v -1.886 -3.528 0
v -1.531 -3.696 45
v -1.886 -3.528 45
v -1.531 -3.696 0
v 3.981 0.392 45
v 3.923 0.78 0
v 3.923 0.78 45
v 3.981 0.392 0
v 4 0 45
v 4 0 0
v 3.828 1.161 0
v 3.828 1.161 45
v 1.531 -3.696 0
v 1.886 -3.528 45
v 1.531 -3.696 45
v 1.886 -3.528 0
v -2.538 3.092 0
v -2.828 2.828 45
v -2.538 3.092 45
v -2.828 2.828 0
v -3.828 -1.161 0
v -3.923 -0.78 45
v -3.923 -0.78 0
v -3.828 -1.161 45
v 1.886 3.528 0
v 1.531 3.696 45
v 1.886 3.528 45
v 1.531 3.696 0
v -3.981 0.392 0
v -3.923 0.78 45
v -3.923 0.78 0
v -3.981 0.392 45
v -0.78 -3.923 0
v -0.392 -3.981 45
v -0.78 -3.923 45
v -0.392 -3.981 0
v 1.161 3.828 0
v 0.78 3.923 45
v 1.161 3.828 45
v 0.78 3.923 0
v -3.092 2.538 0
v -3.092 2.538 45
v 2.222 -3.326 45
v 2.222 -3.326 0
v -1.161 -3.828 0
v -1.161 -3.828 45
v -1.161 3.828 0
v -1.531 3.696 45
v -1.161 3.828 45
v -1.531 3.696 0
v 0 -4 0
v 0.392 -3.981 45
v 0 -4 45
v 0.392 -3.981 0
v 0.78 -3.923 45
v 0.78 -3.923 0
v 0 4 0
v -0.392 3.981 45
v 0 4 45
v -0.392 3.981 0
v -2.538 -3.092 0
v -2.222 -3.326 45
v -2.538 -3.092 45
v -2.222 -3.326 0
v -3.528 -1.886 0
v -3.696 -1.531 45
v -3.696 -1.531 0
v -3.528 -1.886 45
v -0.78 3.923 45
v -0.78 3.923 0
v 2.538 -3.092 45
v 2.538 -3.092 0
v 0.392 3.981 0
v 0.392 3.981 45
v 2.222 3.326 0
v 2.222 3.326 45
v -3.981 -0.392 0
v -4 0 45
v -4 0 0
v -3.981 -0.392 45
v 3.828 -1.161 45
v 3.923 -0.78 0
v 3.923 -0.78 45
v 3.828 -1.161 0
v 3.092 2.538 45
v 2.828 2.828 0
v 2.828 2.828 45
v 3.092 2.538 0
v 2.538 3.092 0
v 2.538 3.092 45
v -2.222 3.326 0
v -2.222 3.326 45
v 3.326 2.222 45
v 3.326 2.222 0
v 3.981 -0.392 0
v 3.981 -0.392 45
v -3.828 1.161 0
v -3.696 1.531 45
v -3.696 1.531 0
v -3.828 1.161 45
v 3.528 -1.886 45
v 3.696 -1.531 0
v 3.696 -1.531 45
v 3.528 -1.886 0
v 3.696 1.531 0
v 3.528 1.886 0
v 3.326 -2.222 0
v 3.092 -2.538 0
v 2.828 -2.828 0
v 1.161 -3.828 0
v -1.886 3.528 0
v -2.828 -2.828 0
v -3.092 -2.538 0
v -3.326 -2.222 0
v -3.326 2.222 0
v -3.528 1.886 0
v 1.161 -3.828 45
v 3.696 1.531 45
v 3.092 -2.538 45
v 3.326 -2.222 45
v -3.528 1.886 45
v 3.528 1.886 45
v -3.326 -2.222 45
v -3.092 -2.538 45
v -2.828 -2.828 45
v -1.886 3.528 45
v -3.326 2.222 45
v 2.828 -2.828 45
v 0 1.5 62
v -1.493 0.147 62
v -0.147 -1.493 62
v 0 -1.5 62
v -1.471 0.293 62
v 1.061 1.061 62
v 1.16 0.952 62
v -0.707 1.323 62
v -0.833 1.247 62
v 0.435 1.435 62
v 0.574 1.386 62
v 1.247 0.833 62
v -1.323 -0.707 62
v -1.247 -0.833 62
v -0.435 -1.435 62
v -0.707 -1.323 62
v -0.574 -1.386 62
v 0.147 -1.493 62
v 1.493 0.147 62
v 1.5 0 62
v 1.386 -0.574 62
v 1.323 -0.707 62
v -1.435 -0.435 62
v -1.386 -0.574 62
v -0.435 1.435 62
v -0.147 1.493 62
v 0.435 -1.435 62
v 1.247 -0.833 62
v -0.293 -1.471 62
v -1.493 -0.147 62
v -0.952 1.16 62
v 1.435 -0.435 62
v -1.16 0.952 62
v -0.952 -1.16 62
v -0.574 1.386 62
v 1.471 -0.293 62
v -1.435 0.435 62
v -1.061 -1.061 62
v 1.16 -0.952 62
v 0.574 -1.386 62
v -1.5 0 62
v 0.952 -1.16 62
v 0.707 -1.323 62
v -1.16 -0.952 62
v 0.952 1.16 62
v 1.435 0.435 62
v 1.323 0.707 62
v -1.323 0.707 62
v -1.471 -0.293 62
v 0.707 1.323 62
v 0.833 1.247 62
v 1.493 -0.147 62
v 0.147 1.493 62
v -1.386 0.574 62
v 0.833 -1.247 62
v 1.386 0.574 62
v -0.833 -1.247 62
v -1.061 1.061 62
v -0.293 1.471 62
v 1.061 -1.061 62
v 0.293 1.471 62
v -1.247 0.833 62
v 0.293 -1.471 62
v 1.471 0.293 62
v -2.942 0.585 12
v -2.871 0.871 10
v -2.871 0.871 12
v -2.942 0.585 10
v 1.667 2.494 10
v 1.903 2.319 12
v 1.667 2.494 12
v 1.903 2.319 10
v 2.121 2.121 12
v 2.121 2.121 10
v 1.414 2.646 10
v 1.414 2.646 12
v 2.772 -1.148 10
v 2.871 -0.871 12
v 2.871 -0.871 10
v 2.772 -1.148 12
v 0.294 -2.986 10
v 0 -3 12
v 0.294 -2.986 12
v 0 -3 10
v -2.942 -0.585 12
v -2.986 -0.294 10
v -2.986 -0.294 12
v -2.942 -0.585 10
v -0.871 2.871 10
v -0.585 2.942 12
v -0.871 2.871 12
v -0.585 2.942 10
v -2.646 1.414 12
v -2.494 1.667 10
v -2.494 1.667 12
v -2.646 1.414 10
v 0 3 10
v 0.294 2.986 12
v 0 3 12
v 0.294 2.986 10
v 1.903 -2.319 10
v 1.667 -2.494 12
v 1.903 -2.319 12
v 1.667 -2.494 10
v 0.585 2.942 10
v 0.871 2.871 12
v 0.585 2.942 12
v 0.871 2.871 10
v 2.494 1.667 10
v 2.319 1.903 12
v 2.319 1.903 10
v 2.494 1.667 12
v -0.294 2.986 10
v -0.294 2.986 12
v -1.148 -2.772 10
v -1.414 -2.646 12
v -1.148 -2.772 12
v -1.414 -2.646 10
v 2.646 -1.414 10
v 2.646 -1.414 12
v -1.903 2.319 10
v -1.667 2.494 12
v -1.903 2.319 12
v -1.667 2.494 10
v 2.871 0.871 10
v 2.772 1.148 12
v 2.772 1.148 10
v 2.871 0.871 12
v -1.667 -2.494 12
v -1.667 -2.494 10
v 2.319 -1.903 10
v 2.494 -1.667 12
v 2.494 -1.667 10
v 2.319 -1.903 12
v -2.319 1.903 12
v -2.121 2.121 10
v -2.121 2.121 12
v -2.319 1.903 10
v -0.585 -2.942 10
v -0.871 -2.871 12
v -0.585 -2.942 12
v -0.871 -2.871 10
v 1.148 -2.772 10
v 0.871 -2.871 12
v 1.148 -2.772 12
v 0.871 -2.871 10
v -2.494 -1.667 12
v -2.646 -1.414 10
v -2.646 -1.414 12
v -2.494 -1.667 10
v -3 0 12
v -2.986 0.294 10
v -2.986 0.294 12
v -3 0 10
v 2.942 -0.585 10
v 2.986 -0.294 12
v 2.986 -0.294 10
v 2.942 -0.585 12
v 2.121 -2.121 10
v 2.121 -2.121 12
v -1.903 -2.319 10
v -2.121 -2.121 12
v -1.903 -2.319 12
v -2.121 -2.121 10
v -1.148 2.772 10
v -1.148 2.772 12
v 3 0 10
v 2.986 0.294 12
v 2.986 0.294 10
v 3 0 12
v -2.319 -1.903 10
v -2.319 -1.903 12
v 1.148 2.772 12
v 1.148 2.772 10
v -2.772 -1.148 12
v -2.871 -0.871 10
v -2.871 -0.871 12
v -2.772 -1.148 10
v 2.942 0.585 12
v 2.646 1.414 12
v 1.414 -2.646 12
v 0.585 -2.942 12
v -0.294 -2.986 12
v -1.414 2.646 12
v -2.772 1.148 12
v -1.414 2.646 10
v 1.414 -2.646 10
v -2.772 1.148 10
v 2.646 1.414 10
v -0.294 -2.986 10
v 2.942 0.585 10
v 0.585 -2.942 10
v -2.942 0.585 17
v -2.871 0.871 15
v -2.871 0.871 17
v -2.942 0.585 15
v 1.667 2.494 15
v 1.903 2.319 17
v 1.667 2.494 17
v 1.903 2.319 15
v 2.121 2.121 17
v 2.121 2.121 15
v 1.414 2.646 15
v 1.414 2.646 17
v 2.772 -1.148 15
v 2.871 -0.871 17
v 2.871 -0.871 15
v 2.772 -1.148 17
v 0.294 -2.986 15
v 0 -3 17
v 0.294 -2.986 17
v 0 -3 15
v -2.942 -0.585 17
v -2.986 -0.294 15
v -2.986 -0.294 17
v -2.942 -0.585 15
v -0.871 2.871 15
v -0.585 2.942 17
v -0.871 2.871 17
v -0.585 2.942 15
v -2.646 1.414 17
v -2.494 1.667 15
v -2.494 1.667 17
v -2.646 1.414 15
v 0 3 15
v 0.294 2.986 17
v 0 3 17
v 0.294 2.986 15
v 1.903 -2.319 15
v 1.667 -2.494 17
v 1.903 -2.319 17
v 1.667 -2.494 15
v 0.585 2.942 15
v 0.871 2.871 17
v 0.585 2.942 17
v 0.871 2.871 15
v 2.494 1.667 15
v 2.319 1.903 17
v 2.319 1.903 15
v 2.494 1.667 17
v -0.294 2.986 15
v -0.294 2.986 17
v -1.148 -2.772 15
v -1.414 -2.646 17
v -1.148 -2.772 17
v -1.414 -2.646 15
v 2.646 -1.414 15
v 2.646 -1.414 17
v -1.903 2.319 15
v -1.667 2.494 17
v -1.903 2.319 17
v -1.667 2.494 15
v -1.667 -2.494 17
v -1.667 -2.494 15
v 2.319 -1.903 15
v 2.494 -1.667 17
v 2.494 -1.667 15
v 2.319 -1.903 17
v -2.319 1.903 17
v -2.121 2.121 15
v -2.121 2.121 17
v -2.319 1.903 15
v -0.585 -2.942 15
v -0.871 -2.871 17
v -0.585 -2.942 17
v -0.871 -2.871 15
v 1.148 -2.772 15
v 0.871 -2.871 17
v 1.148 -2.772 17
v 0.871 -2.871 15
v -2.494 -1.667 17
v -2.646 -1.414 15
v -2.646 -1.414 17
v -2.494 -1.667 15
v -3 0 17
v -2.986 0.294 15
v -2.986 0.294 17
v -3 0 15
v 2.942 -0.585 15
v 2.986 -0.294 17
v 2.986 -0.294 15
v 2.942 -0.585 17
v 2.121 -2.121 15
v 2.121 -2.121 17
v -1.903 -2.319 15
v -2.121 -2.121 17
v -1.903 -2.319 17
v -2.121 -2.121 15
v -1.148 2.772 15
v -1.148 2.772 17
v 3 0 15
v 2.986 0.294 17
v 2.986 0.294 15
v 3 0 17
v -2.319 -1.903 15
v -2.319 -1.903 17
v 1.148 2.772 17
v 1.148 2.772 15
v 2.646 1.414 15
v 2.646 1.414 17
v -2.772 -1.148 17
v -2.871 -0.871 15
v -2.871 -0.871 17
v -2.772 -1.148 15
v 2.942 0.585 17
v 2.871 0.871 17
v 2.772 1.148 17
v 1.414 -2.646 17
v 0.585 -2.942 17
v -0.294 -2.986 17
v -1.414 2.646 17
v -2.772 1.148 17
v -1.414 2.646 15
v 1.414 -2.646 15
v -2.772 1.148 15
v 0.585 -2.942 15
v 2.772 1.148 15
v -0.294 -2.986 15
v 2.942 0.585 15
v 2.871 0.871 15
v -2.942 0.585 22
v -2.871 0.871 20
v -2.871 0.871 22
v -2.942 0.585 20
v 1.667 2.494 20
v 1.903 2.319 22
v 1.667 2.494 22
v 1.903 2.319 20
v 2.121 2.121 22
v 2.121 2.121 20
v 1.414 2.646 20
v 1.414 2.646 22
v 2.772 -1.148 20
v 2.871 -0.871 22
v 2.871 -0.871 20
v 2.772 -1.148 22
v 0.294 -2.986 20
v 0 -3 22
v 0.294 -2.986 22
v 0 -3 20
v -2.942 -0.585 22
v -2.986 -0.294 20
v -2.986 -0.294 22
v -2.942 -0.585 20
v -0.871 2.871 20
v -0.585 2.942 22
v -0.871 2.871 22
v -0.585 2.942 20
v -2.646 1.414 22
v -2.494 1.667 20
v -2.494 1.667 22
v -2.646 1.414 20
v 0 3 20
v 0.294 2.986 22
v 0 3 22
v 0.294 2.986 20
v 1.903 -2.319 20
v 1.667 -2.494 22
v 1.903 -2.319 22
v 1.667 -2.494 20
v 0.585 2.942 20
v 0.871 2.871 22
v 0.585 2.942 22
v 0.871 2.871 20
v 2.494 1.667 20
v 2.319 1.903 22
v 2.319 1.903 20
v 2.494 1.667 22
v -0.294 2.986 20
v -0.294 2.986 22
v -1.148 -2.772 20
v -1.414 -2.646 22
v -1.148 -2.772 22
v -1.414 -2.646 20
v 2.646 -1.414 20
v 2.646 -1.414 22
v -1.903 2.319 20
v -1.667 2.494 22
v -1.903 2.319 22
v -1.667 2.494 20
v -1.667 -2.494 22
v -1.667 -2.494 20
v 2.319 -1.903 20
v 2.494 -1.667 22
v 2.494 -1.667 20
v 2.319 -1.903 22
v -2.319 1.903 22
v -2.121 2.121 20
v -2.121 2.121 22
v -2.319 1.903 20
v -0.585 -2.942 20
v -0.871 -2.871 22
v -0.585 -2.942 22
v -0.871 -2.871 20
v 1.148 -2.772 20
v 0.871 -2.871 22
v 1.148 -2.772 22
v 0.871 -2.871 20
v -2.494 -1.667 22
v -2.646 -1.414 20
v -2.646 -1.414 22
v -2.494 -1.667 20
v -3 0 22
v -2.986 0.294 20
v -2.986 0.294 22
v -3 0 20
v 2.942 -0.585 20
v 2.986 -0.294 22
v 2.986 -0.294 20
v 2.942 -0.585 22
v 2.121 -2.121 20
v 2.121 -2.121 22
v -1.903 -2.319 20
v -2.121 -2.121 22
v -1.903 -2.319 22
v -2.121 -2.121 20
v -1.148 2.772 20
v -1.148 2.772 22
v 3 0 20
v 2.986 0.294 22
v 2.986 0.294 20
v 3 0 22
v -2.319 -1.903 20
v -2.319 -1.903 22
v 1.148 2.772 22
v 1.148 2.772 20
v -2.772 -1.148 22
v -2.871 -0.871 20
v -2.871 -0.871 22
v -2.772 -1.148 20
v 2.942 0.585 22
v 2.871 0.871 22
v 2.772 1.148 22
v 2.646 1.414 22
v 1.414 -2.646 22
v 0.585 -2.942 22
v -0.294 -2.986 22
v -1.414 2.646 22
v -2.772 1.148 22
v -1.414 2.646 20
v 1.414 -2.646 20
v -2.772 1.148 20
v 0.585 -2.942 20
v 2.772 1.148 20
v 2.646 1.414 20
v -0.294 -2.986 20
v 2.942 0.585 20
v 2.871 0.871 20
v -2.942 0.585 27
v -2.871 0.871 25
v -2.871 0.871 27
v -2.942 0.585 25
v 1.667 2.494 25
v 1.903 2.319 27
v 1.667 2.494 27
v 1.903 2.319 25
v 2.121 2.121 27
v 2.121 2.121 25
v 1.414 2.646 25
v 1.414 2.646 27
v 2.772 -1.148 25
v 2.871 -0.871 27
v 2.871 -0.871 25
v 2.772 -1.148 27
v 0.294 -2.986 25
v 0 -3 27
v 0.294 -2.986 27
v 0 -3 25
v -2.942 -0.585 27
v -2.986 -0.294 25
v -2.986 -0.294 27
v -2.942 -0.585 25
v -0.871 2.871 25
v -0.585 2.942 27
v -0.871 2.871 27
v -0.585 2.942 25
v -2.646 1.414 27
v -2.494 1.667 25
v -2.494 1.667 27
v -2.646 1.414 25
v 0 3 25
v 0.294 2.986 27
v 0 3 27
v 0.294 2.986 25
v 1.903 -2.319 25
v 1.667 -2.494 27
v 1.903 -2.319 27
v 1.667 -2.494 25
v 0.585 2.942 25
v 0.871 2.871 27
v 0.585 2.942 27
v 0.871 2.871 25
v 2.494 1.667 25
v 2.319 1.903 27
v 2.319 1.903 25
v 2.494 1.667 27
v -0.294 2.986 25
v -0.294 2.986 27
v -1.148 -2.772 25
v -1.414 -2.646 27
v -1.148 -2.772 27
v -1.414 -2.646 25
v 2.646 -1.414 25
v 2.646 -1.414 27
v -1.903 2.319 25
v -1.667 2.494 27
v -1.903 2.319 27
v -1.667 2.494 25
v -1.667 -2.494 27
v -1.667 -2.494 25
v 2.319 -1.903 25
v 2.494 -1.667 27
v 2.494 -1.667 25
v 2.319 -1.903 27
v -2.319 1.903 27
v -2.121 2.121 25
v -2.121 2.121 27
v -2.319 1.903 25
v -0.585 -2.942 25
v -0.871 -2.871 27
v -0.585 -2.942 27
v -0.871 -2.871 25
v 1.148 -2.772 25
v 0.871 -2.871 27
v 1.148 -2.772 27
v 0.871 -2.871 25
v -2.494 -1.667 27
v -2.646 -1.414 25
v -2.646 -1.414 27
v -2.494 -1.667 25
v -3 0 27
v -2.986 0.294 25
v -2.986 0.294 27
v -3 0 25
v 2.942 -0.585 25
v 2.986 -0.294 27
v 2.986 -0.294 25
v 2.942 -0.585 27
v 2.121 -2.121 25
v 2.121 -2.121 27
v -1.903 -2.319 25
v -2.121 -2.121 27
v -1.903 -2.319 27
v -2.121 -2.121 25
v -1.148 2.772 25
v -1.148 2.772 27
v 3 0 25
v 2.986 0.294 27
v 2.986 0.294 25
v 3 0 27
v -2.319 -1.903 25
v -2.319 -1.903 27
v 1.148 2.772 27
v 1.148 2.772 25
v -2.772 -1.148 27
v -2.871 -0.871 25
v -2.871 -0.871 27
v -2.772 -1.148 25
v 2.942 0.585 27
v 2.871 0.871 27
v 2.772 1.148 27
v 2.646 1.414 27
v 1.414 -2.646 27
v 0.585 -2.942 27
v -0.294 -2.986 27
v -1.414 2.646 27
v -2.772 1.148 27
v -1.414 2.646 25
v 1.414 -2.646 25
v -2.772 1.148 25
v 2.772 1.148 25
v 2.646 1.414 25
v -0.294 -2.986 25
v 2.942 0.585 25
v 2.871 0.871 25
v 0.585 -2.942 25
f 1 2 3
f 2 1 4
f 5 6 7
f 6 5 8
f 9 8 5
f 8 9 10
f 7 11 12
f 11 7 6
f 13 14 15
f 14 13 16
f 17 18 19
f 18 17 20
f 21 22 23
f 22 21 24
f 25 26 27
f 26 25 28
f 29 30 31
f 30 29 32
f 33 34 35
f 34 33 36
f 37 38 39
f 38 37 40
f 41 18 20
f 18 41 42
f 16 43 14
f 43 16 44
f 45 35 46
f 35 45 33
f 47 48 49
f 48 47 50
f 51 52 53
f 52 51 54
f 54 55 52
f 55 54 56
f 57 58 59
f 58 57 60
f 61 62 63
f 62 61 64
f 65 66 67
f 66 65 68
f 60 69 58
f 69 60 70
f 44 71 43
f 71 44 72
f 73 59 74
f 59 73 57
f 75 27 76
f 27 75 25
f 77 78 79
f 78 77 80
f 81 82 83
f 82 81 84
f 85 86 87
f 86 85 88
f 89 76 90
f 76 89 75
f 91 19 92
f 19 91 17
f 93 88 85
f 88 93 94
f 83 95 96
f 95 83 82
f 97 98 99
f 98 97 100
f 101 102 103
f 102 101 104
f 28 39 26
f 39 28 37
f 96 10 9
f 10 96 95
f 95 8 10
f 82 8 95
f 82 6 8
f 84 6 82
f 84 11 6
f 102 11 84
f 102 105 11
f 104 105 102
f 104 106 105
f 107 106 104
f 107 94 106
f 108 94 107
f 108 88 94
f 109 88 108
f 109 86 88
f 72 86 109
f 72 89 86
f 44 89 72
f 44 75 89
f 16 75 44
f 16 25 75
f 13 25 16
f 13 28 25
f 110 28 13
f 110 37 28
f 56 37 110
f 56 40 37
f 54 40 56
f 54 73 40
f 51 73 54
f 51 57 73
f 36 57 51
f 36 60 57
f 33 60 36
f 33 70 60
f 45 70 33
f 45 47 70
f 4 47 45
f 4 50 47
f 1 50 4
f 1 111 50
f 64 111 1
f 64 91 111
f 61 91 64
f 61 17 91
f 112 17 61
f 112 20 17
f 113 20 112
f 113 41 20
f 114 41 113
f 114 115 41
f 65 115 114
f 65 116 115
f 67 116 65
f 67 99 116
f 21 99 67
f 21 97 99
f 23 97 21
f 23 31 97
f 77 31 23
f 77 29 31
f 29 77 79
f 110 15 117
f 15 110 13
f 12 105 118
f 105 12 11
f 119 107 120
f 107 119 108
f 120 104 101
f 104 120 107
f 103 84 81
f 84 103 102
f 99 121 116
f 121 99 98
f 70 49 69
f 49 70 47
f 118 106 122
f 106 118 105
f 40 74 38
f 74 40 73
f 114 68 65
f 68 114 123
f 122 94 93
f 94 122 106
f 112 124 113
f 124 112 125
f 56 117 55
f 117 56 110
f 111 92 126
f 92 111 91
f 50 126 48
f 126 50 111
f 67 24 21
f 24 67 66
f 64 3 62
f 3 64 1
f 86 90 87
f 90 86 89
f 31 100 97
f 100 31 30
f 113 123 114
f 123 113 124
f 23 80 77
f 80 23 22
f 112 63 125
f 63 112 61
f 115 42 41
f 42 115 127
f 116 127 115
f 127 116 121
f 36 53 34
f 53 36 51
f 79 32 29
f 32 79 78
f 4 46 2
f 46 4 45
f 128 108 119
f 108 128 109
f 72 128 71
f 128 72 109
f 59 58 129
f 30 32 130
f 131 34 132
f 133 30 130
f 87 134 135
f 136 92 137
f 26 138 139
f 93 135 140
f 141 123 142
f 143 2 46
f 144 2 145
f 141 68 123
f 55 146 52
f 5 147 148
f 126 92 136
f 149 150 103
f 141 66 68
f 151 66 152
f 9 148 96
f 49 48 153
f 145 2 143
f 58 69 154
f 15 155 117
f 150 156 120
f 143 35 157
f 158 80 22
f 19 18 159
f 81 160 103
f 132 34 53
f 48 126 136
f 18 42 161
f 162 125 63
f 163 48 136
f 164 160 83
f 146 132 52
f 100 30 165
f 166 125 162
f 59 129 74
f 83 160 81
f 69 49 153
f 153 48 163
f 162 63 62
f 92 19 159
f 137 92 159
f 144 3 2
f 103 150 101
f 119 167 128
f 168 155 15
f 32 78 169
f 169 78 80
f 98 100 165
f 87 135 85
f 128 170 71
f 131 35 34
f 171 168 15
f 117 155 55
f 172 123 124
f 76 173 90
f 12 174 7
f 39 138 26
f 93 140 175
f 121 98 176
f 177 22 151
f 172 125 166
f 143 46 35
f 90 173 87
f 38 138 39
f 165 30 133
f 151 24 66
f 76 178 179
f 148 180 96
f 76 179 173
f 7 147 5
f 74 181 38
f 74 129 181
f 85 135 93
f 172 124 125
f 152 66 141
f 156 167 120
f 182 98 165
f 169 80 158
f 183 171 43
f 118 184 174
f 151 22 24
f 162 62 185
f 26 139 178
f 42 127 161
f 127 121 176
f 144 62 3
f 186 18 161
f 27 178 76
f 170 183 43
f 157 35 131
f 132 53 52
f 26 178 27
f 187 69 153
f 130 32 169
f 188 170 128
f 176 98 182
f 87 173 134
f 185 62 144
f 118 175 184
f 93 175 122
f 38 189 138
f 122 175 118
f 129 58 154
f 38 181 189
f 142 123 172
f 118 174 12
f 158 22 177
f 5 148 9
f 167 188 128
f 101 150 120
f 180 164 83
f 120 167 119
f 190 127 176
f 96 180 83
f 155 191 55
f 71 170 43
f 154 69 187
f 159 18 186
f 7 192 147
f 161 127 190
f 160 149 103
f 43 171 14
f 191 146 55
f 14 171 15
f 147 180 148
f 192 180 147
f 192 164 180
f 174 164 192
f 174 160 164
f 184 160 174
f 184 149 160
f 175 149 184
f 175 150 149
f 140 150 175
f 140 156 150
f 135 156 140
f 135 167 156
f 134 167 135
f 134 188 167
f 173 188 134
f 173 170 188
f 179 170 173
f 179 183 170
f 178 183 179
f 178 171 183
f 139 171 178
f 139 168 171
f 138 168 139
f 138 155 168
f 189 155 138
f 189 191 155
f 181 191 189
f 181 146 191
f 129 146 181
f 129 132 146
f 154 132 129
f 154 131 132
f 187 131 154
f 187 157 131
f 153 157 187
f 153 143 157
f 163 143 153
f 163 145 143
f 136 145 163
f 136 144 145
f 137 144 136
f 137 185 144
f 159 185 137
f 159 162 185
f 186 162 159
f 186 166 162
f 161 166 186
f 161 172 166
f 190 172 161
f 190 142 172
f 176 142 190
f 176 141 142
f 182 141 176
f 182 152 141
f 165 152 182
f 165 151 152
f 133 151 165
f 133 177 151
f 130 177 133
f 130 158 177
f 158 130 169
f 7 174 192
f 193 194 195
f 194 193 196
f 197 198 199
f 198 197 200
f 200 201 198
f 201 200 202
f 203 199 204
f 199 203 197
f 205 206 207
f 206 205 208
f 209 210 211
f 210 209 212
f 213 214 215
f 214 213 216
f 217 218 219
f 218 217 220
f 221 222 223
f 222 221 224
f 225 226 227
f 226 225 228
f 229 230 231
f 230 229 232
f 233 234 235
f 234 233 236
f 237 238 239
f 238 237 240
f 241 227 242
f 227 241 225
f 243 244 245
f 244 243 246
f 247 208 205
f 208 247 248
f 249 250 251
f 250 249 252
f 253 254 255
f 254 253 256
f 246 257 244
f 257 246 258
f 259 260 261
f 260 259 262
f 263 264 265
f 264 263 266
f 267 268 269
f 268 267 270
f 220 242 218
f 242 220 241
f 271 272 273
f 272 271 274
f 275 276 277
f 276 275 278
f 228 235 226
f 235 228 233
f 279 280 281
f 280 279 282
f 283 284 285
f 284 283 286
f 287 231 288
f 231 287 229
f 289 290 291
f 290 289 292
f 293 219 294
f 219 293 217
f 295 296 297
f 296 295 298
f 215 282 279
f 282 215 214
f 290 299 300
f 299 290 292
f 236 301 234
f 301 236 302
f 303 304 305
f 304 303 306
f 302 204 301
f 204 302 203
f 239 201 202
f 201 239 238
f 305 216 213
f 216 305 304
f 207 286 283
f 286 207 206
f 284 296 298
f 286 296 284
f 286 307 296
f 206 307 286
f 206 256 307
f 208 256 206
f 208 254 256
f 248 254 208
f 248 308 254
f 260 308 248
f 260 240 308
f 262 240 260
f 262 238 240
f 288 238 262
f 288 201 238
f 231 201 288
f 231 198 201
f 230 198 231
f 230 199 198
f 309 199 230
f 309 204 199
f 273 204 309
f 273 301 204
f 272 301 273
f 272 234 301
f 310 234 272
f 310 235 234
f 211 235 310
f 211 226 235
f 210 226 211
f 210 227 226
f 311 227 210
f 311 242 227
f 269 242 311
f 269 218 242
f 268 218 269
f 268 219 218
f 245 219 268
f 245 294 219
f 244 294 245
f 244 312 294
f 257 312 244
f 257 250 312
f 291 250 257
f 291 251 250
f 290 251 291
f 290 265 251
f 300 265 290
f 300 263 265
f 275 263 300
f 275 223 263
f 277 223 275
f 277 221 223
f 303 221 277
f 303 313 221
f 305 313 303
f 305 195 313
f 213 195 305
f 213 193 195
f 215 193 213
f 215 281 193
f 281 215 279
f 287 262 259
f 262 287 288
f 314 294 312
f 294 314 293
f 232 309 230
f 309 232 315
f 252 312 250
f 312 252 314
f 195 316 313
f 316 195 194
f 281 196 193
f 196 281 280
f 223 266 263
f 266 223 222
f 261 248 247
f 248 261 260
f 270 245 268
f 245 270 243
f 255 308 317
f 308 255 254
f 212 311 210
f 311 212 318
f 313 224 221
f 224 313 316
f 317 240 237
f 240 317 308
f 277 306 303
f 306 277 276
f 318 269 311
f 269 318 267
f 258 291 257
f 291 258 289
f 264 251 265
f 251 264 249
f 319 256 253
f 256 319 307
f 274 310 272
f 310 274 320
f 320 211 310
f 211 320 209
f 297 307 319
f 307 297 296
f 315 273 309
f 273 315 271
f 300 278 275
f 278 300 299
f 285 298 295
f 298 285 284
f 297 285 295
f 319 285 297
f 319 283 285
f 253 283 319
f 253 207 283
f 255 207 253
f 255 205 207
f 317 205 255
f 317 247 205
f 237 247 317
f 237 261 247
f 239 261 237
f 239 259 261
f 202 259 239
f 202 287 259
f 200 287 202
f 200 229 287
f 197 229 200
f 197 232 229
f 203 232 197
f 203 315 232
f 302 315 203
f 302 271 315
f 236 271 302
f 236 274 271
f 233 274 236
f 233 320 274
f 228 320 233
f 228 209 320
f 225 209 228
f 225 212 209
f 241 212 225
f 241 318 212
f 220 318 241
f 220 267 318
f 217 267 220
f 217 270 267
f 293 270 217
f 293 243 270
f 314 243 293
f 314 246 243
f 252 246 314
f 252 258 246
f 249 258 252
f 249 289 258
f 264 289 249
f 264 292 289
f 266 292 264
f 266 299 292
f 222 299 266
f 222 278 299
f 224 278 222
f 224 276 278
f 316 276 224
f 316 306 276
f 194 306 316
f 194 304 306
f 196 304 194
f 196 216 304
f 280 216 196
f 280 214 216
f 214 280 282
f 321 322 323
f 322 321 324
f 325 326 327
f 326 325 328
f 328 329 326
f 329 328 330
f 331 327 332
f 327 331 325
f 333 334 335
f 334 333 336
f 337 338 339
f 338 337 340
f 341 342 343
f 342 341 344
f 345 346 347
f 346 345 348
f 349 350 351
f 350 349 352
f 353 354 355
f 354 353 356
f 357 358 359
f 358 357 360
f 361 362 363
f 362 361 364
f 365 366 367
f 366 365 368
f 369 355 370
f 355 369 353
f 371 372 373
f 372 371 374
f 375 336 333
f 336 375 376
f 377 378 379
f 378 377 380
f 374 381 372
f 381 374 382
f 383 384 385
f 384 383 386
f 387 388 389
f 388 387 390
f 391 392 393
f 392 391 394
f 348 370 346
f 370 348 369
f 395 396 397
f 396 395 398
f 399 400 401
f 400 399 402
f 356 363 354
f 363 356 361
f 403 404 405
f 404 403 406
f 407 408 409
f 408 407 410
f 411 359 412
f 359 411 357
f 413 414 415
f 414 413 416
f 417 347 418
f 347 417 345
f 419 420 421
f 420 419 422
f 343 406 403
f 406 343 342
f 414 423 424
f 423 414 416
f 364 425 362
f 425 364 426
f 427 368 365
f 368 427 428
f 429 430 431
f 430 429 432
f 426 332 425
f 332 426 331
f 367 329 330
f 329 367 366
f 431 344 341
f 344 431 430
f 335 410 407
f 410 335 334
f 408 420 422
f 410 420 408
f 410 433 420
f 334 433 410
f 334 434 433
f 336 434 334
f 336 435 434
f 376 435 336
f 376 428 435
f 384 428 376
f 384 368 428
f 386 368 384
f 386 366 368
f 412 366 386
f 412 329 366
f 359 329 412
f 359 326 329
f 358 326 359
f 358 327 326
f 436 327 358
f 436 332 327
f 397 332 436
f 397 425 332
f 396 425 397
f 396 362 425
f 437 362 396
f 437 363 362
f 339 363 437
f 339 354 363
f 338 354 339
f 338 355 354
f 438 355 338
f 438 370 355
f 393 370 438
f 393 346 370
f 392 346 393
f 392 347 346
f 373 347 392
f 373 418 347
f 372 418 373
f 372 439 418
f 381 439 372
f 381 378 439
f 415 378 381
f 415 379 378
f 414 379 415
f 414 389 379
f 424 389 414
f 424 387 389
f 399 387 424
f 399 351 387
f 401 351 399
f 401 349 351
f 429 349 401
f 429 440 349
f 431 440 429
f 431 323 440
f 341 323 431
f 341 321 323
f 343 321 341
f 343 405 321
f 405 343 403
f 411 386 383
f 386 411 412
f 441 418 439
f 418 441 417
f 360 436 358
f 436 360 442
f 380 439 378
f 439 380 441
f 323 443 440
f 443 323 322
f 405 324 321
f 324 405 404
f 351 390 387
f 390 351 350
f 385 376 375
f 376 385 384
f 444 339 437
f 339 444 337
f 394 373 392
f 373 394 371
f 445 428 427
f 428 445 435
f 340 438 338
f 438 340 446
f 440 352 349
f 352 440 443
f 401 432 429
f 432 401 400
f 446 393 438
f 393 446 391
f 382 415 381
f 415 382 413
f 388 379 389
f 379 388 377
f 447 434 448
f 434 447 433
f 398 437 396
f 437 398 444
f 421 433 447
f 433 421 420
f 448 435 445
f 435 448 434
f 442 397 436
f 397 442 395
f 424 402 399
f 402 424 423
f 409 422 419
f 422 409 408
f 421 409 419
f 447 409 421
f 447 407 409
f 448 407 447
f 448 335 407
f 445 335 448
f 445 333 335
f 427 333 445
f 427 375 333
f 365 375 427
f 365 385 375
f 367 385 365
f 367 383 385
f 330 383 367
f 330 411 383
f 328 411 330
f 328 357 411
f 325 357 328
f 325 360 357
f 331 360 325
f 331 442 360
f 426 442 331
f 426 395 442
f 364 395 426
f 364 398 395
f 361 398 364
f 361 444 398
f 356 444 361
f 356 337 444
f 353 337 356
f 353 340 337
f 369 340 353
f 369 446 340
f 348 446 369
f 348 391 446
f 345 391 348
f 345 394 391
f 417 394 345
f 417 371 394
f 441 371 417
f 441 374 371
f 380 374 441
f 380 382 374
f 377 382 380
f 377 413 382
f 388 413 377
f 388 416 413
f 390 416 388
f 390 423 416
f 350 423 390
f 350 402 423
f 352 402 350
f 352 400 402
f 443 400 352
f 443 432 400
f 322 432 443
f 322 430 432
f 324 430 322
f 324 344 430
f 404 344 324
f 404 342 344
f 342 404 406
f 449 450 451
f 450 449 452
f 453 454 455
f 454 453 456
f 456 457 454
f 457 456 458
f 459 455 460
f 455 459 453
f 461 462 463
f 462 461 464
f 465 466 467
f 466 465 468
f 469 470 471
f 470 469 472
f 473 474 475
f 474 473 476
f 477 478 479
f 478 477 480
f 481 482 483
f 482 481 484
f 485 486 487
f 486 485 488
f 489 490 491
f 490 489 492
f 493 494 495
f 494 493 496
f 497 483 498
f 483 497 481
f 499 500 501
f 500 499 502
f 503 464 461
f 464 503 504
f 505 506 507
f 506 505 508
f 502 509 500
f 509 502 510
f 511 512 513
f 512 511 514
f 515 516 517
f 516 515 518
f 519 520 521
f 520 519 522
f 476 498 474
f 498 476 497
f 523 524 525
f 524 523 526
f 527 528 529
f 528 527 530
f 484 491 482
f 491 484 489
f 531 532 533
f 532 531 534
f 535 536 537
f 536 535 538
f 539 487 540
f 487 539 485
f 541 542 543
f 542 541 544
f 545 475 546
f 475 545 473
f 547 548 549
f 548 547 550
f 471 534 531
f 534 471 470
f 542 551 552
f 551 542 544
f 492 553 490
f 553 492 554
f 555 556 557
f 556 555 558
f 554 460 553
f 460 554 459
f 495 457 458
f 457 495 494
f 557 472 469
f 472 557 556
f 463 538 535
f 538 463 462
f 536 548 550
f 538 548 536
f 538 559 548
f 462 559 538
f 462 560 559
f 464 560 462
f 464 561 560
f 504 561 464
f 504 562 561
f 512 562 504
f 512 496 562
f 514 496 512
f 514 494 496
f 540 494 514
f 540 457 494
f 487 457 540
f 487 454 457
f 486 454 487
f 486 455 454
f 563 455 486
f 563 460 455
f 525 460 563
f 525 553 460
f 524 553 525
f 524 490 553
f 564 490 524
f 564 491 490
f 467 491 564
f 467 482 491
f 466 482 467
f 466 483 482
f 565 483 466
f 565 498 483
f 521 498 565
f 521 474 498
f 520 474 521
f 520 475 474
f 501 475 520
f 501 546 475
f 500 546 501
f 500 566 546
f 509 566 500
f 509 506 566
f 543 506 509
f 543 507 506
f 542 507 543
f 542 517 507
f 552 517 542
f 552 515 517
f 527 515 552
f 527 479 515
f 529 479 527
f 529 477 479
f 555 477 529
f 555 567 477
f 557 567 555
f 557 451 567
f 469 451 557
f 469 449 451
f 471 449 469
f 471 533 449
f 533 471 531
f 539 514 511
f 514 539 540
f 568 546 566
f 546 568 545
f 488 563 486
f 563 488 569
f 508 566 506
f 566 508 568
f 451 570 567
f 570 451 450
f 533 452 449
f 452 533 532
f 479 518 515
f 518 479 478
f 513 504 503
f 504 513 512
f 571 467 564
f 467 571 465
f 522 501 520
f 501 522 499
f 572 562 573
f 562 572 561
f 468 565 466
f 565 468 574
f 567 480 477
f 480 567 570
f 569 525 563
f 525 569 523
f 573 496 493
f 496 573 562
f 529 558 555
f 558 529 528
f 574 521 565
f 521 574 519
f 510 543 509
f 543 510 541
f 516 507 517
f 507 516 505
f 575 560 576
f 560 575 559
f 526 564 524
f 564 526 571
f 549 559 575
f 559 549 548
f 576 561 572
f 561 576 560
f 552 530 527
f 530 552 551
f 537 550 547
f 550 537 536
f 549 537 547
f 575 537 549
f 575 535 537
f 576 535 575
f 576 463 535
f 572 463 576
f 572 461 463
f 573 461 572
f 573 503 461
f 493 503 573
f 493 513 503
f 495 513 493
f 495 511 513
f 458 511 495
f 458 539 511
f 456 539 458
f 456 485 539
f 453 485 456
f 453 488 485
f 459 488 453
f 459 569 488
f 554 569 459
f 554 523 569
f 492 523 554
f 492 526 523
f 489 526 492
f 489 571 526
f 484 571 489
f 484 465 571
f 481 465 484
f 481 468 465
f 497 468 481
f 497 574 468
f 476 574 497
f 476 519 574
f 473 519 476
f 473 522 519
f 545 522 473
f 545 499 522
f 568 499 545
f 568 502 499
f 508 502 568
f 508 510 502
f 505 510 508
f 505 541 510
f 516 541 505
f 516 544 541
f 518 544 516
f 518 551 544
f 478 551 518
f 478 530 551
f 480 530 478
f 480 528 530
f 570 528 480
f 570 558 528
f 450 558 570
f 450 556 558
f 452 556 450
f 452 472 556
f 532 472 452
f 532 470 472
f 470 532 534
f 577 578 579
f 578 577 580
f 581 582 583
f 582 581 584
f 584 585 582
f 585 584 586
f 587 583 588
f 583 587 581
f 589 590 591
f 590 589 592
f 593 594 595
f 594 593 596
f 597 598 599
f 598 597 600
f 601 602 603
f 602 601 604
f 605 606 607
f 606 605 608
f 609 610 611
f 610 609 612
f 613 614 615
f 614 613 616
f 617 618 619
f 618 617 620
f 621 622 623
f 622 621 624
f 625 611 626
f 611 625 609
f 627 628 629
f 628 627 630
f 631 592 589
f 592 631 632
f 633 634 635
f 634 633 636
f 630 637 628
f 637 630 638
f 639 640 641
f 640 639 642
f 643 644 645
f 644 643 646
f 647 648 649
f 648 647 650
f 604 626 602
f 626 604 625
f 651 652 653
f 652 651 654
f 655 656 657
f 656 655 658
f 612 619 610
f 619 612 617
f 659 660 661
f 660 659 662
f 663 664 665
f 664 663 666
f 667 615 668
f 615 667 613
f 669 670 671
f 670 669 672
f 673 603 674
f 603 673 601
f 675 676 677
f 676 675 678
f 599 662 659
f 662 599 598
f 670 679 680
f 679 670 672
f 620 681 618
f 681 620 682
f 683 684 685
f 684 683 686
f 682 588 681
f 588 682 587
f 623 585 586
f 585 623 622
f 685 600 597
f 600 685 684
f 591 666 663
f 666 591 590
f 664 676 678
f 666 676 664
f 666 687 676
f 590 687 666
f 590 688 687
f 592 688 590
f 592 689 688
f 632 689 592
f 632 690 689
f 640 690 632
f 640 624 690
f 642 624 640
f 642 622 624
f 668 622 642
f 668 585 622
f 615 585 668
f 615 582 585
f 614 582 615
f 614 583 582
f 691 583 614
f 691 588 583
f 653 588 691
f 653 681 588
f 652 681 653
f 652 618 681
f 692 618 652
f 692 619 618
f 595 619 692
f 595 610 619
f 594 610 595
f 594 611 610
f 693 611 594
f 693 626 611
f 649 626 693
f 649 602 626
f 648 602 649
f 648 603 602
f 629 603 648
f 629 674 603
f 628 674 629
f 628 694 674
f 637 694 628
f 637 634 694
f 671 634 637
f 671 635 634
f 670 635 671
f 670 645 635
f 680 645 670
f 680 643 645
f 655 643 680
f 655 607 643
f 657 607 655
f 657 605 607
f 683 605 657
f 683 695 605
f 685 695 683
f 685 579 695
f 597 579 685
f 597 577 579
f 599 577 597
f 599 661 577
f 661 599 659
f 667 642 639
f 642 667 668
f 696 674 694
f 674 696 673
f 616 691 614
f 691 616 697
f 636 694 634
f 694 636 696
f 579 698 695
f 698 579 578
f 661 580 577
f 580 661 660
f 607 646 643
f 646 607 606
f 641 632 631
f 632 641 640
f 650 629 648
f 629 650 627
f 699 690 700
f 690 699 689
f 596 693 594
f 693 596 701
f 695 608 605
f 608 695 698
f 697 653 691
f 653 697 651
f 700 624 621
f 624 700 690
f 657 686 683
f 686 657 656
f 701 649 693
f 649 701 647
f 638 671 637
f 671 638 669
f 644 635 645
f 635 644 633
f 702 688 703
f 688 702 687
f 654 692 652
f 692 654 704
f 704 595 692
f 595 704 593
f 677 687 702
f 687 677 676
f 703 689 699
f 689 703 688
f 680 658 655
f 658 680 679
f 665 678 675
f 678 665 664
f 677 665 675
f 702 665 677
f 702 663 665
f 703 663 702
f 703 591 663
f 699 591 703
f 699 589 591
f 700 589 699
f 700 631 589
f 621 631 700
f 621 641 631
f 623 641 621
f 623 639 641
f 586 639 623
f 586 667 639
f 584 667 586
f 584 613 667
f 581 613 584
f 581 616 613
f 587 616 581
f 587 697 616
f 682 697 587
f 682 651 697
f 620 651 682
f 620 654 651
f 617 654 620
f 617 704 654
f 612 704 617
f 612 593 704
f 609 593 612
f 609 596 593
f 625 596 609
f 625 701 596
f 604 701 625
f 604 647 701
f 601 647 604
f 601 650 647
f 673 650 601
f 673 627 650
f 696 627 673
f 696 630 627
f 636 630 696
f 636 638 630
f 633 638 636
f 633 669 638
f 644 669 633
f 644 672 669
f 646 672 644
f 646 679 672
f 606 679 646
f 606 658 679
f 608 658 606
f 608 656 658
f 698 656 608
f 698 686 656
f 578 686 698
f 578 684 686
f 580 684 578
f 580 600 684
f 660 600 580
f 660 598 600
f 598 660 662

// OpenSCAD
// Pestle for grinding tissue inside a 1.5 mL microcentrifuge tube - a cylindrical handle with
// grip grooves, a tapering cone, and a rounded tip. Printed standing upright (z = 0 at the
// bottom). NOVEL general part.
//

handle_d = 8;
cone_top = 8;
cone_bot = 3;
tip_d    = 3;
groove_w = 2;
groove_d = 1;

$fn = 64;

handle_h = 45;
cone_h   = 62 - 45;
tip_h    = 62;

difference() {
    union() {
        cylinder(h = handle_h, d = handle_d);
        translate([0, 0, handle_h]) rotate([0, 0, 90]) cylinder(h = cone_h, d1 = cone_top, d2 = cone_bot);
        translate([0, 0, tip_h - tip_h / 2]) sphere(d = tip_d);
    }
    for (z = [10, 15, 20, 25])
        translate([0, 0, z]) rotate([0, 0, 45]) cylinder(h = groove_w, d = handle_d - 2 * groove_d);
}
